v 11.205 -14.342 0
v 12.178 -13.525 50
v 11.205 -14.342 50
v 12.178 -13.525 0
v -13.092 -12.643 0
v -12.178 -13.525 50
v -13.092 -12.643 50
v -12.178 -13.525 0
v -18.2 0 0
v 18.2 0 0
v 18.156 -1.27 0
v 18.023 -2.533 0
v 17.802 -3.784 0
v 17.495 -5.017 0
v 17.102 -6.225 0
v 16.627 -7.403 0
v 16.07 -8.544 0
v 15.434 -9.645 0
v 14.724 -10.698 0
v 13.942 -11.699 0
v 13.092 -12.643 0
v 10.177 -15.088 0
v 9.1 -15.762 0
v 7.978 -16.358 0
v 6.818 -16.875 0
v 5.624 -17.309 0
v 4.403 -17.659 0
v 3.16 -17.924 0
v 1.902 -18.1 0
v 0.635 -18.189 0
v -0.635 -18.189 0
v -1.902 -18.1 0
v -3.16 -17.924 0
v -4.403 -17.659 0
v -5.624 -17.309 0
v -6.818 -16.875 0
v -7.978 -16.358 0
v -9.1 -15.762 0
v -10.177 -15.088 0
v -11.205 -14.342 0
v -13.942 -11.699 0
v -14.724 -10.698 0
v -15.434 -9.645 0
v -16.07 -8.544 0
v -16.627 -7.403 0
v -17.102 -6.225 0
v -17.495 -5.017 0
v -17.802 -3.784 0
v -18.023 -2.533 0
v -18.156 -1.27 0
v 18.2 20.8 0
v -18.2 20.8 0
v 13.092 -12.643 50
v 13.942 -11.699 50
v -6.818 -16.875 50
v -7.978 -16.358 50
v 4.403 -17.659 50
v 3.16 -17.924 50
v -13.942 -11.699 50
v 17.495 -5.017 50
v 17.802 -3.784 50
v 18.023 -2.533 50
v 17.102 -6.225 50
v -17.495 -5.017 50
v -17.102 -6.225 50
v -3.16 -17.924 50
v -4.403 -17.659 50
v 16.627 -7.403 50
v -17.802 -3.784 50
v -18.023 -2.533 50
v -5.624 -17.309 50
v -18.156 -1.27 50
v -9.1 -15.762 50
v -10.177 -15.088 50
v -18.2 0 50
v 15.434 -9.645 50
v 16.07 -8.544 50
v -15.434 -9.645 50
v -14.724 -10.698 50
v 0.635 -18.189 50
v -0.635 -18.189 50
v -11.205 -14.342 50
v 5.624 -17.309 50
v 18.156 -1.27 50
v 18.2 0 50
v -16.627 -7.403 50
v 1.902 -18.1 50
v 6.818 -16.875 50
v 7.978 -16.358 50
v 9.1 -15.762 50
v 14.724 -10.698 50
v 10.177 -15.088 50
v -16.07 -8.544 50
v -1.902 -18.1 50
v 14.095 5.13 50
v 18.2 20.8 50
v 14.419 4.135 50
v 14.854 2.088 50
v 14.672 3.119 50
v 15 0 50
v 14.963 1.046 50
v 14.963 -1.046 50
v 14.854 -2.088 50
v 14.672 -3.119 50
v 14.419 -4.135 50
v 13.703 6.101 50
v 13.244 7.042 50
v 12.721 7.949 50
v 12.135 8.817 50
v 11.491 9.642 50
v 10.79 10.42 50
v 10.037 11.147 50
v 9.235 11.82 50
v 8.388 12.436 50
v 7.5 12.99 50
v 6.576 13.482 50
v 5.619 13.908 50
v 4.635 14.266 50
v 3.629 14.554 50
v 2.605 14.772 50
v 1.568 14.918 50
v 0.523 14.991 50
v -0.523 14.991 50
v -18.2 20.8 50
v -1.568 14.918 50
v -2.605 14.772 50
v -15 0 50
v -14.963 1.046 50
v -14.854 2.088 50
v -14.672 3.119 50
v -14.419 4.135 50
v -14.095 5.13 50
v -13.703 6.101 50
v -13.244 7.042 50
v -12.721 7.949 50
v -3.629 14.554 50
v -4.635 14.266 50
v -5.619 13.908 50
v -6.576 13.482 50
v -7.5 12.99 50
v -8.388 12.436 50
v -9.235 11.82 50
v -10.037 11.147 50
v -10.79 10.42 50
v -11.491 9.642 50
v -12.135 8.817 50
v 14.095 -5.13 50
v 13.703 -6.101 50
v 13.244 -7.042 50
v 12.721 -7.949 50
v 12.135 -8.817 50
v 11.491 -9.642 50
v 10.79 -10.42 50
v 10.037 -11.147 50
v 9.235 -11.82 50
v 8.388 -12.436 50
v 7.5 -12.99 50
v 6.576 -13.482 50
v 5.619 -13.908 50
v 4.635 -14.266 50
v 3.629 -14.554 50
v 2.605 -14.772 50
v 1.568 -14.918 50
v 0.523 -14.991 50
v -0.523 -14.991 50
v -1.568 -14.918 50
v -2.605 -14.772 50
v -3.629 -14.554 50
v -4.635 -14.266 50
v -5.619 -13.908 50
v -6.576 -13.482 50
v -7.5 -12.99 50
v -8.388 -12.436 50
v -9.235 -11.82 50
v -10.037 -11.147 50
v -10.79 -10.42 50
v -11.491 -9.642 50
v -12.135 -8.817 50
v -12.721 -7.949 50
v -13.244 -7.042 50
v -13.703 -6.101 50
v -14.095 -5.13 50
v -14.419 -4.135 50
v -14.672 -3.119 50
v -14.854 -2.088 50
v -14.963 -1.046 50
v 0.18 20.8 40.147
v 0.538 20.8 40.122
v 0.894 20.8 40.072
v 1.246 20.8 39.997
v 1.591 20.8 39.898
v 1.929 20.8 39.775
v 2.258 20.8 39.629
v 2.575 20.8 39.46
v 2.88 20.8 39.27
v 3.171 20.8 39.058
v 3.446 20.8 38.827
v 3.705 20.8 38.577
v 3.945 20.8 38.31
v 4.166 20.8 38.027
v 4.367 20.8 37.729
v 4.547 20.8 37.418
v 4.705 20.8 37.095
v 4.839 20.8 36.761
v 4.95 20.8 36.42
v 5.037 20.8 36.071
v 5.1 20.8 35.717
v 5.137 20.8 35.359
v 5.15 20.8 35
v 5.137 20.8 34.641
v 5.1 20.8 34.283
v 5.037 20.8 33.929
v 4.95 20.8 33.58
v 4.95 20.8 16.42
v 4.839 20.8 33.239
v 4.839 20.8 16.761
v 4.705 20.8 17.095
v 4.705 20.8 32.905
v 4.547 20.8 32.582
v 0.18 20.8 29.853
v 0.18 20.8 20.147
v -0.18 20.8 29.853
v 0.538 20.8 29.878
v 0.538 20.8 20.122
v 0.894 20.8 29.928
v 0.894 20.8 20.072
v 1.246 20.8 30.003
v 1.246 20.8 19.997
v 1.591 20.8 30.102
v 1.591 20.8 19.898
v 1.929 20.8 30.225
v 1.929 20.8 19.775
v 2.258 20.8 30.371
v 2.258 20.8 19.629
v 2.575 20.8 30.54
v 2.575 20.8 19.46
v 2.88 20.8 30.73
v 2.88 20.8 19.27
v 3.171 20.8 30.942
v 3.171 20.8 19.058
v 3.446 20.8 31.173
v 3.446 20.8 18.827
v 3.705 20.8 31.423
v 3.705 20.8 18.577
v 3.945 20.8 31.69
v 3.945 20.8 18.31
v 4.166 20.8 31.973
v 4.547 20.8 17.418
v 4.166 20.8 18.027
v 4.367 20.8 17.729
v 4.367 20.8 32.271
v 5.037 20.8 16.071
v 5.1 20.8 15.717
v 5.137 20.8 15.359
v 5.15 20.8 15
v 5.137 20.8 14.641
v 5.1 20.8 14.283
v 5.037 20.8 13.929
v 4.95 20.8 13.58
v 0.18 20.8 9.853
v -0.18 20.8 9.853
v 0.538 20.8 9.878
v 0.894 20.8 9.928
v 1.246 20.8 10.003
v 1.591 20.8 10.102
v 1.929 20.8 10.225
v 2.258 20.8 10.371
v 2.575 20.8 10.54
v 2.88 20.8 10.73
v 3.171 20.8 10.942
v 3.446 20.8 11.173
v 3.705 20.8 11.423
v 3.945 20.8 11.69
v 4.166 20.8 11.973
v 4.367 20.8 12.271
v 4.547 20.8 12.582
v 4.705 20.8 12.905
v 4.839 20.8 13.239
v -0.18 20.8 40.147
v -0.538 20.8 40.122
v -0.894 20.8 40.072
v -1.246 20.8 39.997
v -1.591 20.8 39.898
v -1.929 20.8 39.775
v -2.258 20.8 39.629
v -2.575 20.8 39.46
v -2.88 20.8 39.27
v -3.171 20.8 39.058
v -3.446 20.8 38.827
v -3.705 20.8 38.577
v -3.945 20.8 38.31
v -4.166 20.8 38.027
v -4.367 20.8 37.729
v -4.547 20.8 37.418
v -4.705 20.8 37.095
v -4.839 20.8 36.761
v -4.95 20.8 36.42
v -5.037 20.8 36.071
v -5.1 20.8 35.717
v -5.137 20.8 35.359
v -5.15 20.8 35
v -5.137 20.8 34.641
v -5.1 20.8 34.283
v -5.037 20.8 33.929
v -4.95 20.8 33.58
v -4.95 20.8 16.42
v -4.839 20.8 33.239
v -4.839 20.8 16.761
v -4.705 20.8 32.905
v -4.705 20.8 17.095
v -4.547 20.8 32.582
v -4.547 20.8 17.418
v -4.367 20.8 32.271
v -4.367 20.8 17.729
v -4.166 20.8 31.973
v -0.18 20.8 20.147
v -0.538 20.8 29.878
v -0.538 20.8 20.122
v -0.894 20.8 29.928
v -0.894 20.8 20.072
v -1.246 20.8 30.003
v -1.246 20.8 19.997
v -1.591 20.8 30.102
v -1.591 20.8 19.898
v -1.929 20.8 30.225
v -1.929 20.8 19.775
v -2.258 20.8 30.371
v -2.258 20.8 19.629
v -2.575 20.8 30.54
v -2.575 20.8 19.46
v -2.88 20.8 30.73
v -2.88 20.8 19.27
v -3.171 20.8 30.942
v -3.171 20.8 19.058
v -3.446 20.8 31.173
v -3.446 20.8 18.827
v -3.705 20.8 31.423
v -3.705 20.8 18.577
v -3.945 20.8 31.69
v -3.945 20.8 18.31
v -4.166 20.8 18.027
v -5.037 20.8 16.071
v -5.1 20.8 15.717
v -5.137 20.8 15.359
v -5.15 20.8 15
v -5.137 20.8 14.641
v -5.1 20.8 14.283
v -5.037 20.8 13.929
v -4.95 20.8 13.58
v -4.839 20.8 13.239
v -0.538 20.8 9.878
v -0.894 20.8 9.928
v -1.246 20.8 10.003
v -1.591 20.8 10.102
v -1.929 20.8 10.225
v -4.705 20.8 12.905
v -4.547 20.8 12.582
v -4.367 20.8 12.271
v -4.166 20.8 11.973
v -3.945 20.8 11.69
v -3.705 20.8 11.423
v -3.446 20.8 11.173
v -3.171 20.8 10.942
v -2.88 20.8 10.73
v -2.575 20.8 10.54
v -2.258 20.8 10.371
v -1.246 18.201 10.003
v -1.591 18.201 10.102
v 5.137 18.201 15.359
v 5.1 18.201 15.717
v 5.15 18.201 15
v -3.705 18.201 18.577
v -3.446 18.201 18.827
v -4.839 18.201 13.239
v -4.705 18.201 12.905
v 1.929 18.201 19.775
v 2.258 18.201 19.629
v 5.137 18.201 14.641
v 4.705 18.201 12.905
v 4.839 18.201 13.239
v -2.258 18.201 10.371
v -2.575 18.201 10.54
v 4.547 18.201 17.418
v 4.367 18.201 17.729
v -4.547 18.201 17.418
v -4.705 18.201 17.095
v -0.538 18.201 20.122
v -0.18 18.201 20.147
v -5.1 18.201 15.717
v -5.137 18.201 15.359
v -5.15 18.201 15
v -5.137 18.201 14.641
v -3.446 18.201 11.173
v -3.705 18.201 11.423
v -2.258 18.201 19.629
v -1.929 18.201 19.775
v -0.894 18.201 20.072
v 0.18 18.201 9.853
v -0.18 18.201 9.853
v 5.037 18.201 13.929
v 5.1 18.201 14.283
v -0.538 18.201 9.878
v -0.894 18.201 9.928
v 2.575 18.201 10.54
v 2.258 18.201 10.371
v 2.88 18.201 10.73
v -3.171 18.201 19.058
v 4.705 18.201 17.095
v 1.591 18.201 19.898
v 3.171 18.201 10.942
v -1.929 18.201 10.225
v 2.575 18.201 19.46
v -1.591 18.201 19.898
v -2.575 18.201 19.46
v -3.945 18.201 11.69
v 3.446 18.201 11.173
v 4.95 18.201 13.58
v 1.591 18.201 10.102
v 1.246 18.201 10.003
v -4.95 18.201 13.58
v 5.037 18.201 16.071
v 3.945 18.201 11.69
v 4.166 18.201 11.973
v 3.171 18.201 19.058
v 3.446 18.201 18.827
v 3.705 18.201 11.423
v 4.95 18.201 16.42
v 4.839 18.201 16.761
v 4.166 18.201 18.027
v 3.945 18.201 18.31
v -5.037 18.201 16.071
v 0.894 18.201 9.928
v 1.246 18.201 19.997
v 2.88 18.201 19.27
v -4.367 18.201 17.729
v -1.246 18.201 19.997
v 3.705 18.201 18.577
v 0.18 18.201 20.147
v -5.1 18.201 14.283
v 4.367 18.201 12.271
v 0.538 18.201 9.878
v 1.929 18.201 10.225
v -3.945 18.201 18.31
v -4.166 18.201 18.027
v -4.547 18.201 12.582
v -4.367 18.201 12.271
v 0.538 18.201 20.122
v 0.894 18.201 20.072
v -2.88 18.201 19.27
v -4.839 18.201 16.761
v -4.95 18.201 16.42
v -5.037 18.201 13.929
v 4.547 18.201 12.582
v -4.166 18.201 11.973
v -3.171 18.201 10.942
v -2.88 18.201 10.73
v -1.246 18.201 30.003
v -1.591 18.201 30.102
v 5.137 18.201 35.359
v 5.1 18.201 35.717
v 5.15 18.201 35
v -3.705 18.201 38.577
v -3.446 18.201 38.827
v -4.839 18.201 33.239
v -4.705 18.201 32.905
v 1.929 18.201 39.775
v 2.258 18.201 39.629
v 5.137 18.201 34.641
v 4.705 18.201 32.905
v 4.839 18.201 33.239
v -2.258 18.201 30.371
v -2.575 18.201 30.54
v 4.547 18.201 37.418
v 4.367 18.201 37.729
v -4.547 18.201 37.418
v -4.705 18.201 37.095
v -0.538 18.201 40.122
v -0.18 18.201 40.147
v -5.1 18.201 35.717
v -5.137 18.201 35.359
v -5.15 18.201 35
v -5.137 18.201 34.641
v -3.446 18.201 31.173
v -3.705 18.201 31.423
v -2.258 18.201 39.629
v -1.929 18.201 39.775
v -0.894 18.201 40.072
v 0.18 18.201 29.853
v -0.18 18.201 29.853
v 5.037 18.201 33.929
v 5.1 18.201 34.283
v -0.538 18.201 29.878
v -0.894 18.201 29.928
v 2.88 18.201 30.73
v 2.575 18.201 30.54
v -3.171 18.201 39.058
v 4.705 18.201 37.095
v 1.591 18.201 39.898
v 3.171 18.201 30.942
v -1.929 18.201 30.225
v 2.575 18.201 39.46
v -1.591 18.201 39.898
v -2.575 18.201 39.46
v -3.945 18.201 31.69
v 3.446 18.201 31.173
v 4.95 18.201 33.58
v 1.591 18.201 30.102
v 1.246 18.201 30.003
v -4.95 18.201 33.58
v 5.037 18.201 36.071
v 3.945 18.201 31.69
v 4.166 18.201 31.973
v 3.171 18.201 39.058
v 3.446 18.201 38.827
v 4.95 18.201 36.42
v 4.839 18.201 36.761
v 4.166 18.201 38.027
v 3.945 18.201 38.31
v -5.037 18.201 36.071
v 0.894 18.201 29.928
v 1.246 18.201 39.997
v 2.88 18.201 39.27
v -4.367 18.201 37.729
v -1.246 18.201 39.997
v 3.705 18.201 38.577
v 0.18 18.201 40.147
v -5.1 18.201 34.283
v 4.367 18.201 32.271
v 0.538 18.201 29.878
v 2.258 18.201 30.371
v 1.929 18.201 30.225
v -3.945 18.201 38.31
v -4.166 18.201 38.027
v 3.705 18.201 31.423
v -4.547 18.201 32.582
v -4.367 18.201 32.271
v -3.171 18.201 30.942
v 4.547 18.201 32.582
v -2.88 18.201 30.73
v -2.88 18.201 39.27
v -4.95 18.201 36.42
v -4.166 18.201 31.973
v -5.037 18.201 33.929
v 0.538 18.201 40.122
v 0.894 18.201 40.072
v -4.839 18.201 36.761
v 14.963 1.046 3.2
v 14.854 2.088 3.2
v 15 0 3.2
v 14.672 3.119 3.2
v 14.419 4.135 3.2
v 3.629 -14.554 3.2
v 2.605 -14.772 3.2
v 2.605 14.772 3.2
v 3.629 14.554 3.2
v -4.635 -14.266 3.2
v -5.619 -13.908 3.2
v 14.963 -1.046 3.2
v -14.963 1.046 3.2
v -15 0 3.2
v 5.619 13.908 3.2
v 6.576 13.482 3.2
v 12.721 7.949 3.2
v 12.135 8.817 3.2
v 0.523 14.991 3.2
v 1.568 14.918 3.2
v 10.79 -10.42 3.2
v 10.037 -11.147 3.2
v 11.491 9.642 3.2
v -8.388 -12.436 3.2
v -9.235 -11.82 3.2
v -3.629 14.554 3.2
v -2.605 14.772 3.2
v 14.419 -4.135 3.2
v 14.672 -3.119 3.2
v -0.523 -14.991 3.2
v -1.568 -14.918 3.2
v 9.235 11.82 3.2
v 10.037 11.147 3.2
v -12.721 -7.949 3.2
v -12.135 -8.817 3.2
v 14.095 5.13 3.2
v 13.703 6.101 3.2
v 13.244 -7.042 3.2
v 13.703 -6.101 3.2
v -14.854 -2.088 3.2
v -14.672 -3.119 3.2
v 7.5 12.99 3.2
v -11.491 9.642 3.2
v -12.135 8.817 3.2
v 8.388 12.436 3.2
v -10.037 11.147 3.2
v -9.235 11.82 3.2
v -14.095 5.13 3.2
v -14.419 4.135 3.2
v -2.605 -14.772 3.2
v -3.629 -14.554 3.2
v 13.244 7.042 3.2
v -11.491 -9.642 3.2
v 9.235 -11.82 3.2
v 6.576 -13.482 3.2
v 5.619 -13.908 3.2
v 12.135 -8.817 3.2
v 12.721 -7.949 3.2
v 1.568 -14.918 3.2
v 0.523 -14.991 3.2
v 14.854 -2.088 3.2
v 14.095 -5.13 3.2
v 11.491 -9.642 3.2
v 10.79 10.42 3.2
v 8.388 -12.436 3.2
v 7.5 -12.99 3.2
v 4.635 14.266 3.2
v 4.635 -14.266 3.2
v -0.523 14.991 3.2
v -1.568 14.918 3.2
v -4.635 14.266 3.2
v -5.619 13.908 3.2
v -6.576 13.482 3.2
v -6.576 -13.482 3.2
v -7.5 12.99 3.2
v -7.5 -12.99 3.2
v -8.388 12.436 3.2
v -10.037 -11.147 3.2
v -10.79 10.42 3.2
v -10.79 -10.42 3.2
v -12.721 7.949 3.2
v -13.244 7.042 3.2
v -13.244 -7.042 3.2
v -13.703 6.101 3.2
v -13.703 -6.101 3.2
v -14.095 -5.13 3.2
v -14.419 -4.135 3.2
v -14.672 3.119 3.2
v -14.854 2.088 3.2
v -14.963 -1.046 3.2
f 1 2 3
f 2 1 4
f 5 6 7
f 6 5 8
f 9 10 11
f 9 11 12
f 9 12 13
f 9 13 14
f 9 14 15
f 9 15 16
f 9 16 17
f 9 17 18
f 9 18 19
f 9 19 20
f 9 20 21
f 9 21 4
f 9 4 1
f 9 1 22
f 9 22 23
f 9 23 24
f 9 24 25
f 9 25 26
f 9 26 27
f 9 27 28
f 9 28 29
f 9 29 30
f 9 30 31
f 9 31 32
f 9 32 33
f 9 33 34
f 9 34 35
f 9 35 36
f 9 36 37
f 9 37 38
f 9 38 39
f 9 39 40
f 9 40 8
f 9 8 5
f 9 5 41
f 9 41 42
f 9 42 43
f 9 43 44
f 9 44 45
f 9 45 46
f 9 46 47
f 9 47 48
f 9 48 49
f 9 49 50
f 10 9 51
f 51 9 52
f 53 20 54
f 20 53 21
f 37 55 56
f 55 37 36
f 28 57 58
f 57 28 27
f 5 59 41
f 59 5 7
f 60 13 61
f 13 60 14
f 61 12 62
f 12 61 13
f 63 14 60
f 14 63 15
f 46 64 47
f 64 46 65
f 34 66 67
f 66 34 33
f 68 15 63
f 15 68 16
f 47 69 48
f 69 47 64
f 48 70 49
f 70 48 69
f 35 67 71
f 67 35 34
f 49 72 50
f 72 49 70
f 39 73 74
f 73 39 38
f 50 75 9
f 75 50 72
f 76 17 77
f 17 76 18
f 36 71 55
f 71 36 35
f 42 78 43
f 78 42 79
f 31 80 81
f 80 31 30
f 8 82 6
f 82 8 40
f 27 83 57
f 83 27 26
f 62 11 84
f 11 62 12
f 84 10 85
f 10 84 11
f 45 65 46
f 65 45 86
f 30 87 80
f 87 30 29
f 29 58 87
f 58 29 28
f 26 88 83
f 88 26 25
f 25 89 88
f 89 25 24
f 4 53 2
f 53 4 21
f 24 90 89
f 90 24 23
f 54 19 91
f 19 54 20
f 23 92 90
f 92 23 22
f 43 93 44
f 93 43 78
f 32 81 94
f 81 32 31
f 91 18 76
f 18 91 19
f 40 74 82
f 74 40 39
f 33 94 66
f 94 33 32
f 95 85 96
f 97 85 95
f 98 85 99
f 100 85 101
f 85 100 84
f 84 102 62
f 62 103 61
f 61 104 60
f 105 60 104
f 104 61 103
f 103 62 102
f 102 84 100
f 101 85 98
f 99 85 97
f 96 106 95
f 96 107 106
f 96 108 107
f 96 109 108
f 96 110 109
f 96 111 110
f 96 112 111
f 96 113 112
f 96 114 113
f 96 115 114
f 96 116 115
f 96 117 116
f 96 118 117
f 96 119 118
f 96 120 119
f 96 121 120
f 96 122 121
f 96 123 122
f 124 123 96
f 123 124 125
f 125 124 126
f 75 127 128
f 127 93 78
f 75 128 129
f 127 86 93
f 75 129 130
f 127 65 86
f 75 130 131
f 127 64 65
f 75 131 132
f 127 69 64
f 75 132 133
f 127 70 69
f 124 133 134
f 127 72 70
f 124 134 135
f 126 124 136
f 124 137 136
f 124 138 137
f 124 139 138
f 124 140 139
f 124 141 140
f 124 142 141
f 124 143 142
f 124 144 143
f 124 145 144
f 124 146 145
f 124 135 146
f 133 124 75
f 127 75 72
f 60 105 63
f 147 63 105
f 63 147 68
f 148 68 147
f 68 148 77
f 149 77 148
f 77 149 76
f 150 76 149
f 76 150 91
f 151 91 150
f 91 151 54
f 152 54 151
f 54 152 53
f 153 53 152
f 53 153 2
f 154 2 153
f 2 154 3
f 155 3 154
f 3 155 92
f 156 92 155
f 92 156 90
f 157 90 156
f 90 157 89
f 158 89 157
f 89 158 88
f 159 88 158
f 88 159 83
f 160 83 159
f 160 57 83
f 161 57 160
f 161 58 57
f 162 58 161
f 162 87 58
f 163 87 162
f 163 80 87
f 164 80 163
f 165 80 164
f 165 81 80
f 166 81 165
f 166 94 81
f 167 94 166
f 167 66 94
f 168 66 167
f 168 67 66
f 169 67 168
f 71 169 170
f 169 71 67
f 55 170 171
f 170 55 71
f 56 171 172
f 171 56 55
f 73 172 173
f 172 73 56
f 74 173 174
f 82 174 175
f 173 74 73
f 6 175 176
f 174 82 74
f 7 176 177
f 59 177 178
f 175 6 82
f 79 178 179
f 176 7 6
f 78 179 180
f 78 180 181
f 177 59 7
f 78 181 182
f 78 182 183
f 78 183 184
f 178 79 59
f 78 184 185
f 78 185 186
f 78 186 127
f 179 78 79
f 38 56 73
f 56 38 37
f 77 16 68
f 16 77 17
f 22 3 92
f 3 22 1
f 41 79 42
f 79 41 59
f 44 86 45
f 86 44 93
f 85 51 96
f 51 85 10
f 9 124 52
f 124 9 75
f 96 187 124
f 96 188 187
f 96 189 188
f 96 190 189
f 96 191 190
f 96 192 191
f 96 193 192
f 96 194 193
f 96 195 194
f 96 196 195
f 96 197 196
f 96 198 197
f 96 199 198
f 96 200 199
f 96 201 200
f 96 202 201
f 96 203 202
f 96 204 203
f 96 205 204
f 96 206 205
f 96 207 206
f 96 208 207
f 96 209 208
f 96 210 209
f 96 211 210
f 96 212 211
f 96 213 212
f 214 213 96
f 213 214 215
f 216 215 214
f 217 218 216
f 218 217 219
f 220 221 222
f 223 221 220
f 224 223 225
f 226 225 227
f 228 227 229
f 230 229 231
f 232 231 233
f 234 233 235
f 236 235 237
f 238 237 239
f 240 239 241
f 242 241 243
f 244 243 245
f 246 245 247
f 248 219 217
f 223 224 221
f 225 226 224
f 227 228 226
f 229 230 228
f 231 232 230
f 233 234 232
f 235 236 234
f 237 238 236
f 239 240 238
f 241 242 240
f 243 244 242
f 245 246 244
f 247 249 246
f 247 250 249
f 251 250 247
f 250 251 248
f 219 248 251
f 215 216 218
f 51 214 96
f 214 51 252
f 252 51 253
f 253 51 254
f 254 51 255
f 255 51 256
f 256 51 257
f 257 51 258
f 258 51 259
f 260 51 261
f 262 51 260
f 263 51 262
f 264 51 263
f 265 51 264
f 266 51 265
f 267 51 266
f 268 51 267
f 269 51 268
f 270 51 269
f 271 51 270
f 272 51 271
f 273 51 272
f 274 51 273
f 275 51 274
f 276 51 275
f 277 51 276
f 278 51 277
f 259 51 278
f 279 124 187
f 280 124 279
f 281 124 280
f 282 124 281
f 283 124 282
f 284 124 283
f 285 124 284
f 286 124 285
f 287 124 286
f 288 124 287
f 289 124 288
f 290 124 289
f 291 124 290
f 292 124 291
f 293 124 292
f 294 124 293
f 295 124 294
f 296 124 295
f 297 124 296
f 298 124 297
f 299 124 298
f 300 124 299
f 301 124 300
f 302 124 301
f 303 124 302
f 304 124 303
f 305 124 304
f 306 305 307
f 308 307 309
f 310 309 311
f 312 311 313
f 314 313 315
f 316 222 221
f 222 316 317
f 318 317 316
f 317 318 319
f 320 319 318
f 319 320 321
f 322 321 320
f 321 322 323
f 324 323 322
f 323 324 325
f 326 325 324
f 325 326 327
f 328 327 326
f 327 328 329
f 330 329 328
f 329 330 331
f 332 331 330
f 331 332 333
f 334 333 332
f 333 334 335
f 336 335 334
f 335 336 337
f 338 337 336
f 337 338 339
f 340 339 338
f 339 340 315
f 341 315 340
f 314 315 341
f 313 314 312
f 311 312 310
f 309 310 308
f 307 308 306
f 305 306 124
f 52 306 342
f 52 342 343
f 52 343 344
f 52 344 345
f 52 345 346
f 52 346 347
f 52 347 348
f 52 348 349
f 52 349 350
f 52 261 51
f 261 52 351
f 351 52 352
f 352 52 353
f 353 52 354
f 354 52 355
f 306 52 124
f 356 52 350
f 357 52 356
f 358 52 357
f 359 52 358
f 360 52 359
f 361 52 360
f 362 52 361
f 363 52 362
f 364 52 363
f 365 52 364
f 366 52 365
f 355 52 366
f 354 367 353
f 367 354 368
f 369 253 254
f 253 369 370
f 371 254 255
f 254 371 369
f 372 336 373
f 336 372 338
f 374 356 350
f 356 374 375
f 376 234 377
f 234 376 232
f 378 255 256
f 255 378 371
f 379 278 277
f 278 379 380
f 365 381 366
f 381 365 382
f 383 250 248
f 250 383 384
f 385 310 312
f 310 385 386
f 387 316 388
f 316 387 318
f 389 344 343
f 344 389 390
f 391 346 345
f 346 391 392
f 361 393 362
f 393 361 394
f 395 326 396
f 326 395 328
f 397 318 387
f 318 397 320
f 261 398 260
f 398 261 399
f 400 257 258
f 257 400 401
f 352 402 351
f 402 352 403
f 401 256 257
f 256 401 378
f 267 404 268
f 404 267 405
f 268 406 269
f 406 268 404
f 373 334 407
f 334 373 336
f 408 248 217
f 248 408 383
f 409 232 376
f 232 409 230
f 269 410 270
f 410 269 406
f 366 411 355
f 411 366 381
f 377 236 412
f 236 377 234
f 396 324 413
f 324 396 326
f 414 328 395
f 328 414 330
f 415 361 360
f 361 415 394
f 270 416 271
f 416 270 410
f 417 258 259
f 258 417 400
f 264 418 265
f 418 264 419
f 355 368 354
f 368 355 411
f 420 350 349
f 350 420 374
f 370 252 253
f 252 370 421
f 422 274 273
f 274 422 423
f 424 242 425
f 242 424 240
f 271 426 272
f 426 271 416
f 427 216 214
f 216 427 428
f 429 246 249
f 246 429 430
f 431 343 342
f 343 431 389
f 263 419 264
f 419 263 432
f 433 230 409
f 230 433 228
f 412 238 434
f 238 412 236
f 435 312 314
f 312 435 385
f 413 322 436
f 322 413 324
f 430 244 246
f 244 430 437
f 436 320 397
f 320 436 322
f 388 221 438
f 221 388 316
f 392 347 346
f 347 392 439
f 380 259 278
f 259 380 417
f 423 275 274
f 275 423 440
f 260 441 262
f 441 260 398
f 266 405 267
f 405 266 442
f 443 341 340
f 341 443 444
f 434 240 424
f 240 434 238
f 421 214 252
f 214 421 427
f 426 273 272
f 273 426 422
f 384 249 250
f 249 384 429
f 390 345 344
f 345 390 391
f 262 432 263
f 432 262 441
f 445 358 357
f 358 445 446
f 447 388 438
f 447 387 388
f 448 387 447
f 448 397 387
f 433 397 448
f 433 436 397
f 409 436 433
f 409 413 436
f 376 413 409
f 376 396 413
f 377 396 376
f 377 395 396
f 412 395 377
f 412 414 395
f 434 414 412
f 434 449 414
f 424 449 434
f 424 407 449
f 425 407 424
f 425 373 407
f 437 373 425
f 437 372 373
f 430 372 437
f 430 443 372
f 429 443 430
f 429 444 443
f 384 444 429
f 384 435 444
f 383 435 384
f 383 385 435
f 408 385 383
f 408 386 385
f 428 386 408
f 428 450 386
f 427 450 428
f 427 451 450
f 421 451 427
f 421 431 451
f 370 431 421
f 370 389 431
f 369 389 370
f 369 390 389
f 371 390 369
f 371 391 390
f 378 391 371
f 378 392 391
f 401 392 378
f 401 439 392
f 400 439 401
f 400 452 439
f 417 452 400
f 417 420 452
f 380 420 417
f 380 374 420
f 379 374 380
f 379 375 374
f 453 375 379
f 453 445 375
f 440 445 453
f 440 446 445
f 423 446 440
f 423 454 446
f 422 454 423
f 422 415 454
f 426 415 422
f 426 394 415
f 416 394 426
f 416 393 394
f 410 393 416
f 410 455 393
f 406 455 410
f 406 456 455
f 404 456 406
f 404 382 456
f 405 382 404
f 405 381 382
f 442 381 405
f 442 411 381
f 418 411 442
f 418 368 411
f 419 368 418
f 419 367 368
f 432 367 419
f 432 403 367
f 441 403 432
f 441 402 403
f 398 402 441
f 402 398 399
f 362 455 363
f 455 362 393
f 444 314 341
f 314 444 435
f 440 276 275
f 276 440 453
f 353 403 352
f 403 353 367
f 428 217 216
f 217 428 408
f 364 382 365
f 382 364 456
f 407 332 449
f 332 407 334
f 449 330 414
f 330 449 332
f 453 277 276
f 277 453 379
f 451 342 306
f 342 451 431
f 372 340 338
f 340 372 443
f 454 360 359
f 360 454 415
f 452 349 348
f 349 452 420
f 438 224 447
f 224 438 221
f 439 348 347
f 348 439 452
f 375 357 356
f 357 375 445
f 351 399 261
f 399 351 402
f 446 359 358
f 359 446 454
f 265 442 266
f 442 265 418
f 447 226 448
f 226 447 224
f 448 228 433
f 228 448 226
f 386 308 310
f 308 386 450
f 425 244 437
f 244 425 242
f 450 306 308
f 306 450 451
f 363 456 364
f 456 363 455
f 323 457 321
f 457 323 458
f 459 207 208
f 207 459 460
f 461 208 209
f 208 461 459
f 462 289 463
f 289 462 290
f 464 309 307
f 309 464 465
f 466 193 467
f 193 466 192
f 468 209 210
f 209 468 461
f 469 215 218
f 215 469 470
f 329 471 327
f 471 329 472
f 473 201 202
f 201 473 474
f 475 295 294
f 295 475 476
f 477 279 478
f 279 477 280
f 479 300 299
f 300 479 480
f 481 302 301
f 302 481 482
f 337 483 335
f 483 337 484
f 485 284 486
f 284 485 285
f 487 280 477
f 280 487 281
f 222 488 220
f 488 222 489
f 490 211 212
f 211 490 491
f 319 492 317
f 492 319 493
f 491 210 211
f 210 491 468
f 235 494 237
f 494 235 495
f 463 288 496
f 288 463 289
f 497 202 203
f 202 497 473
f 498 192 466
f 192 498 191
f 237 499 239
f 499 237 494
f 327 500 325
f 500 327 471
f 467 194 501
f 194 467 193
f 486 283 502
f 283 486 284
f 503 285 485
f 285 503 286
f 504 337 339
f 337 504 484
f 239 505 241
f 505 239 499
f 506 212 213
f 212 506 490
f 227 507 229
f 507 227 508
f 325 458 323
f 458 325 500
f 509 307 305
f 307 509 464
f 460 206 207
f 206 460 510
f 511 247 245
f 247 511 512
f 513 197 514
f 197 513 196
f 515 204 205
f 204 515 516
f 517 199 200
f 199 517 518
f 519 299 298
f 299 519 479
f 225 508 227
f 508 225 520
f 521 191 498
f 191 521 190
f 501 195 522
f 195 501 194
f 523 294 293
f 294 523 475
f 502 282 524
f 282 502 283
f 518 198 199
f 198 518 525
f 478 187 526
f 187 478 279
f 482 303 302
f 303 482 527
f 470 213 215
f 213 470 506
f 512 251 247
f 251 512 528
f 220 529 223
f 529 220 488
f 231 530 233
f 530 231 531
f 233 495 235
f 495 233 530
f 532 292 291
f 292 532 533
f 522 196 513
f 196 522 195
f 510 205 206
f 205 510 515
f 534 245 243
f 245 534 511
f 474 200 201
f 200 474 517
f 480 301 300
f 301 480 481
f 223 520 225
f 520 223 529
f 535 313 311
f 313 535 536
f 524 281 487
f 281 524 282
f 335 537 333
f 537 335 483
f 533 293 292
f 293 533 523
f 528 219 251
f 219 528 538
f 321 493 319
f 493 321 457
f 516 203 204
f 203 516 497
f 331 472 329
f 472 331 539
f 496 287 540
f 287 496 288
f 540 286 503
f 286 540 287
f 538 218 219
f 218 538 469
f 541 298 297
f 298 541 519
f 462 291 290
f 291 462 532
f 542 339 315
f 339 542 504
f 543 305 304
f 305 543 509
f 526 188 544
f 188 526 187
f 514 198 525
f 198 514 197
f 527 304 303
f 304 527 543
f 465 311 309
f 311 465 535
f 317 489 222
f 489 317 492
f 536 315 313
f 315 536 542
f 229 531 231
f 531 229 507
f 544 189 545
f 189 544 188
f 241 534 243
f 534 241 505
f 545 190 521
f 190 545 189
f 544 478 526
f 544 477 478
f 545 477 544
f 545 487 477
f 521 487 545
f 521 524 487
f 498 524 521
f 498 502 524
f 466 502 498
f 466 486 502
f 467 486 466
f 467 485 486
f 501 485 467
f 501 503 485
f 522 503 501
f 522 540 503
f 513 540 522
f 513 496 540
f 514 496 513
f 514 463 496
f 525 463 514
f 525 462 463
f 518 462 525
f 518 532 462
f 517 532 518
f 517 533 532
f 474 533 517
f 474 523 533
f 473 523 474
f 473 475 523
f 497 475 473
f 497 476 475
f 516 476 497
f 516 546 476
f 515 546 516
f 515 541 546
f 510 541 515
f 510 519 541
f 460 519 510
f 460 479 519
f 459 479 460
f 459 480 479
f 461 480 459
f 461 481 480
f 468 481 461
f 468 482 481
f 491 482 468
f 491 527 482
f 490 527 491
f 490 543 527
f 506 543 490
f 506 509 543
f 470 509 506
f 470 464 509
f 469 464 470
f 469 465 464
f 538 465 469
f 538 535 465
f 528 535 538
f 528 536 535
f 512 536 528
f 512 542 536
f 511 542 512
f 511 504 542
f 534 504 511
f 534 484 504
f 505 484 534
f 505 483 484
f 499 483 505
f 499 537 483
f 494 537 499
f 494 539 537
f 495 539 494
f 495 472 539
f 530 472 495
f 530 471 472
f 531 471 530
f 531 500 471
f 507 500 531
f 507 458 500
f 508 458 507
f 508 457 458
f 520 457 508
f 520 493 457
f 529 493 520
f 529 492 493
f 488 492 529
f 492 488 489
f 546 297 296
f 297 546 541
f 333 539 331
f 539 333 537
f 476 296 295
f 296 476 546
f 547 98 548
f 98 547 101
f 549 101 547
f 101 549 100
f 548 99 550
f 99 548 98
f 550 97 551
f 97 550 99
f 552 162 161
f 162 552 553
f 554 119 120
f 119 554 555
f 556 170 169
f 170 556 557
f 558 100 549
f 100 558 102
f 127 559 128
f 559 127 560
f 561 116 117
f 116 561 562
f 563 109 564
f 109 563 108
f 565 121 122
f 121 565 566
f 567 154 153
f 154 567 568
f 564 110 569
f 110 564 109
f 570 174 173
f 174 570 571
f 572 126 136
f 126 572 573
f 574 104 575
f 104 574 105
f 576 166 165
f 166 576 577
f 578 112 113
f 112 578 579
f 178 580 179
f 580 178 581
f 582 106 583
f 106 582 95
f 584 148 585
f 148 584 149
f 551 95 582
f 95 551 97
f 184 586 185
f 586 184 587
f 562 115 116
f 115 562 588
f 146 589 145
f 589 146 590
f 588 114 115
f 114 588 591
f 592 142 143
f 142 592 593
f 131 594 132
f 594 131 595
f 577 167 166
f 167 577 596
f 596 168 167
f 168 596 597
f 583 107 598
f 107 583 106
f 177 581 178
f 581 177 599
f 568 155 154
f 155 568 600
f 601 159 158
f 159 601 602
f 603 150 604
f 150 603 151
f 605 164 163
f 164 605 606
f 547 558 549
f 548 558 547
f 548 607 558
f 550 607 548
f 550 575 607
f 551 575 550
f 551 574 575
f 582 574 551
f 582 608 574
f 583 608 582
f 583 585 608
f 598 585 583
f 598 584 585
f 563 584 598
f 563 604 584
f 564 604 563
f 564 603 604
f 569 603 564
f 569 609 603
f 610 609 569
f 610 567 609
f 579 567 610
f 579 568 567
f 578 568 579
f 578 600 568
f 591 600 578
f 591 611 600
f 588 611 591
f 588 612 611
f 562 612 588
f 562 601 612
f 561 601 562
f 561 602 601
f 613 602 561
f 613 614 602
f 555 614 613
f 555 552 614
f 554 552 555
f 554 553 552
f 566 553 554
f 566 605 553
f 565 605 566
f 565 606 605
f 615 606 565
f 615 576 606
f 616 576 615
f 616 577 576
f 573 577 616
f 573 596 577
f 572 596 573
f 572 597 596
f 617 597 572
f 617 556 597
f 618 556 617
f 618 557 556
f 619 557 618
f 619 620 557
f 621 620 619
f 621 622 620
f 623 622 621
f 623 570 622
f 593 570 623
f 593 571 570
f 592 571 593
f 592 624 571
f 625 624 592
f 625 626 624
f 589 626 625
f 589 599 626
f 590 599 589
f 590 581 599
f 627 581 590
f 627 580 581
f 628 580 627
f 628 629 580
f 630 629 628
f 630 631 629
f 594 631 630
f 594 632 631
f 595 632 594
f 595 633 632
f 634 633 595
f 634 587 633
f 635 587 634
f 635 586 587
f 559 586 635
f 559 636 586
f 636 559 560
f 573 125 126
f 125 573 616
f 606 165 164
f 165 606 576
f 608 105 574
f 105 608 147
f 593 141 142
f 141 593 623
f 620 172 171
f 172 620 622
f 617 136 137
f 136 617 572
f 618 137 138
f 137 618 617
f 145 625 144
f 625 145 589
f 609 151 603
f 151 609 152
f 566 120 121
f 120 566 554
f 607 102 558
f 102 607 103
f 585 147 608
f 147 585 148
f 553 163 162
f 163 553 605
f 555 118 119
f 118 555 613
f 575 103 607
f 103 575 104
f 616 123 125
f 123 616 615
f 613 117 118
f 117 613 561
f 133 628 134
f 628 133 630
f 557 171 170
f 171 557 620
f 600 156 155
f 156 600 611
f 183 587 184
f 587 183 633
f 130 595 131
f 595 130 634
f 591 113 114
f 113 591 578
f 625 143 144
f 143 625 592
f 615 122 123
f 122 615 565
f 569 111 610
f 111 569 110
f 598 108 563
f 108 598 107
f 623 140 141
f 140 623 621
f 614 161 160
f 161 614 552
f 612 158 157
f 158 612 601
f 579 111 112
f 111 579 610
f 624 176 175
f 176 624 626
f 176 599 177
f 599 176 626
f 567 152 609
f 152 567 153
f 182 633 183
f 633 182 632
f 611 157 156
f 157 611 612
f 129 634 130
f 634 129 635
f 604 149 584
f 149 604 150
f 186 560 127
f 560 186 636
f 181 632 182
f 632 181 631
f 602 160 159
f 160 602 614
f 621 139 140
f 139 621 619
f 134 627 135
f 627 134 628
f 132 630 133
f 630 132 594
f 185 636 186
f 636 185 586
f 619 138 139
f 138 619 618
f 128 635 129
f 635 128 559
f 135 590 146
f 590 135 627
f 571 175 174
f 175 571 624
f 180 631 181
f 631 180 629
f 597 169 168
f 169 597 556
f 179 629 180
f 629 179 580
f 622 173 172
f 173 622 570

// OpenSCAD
$fa=4; // default minimum facet angle is now 0.5
$fs=0.05; // default minimum facet size is now 0.05 mm

magRad = 5.15;
magDepth = 2.6;

glueStickRad = 15;
wallThickness = 3.2;

difference() {
  union() {
    cylinder(h = 50, r = glueStickRad + wallThickness);
    translate([-(glueStickRad + wallThickness), 0, 0]) cube([(glueStickRad + wallThickness) * 2, glueStickRad + wallThickness + magDepth, 50]);
  }


  #magnetHole(0, glueStickRad + wallThickness + magDepth + .001, 15);
  #magnetHole(0, glueStickRad + wallThickness + magDepth + .001, 35);
  translate([0, 0, wallThickness]) cylinder(h = 50, r = glueStickRad); 
}


module magnetHole(x, y, z) {
  translate([x, y, z]) rotate([90, 0, 0]) cylinder(r = magRad, h = magDepth);
}
